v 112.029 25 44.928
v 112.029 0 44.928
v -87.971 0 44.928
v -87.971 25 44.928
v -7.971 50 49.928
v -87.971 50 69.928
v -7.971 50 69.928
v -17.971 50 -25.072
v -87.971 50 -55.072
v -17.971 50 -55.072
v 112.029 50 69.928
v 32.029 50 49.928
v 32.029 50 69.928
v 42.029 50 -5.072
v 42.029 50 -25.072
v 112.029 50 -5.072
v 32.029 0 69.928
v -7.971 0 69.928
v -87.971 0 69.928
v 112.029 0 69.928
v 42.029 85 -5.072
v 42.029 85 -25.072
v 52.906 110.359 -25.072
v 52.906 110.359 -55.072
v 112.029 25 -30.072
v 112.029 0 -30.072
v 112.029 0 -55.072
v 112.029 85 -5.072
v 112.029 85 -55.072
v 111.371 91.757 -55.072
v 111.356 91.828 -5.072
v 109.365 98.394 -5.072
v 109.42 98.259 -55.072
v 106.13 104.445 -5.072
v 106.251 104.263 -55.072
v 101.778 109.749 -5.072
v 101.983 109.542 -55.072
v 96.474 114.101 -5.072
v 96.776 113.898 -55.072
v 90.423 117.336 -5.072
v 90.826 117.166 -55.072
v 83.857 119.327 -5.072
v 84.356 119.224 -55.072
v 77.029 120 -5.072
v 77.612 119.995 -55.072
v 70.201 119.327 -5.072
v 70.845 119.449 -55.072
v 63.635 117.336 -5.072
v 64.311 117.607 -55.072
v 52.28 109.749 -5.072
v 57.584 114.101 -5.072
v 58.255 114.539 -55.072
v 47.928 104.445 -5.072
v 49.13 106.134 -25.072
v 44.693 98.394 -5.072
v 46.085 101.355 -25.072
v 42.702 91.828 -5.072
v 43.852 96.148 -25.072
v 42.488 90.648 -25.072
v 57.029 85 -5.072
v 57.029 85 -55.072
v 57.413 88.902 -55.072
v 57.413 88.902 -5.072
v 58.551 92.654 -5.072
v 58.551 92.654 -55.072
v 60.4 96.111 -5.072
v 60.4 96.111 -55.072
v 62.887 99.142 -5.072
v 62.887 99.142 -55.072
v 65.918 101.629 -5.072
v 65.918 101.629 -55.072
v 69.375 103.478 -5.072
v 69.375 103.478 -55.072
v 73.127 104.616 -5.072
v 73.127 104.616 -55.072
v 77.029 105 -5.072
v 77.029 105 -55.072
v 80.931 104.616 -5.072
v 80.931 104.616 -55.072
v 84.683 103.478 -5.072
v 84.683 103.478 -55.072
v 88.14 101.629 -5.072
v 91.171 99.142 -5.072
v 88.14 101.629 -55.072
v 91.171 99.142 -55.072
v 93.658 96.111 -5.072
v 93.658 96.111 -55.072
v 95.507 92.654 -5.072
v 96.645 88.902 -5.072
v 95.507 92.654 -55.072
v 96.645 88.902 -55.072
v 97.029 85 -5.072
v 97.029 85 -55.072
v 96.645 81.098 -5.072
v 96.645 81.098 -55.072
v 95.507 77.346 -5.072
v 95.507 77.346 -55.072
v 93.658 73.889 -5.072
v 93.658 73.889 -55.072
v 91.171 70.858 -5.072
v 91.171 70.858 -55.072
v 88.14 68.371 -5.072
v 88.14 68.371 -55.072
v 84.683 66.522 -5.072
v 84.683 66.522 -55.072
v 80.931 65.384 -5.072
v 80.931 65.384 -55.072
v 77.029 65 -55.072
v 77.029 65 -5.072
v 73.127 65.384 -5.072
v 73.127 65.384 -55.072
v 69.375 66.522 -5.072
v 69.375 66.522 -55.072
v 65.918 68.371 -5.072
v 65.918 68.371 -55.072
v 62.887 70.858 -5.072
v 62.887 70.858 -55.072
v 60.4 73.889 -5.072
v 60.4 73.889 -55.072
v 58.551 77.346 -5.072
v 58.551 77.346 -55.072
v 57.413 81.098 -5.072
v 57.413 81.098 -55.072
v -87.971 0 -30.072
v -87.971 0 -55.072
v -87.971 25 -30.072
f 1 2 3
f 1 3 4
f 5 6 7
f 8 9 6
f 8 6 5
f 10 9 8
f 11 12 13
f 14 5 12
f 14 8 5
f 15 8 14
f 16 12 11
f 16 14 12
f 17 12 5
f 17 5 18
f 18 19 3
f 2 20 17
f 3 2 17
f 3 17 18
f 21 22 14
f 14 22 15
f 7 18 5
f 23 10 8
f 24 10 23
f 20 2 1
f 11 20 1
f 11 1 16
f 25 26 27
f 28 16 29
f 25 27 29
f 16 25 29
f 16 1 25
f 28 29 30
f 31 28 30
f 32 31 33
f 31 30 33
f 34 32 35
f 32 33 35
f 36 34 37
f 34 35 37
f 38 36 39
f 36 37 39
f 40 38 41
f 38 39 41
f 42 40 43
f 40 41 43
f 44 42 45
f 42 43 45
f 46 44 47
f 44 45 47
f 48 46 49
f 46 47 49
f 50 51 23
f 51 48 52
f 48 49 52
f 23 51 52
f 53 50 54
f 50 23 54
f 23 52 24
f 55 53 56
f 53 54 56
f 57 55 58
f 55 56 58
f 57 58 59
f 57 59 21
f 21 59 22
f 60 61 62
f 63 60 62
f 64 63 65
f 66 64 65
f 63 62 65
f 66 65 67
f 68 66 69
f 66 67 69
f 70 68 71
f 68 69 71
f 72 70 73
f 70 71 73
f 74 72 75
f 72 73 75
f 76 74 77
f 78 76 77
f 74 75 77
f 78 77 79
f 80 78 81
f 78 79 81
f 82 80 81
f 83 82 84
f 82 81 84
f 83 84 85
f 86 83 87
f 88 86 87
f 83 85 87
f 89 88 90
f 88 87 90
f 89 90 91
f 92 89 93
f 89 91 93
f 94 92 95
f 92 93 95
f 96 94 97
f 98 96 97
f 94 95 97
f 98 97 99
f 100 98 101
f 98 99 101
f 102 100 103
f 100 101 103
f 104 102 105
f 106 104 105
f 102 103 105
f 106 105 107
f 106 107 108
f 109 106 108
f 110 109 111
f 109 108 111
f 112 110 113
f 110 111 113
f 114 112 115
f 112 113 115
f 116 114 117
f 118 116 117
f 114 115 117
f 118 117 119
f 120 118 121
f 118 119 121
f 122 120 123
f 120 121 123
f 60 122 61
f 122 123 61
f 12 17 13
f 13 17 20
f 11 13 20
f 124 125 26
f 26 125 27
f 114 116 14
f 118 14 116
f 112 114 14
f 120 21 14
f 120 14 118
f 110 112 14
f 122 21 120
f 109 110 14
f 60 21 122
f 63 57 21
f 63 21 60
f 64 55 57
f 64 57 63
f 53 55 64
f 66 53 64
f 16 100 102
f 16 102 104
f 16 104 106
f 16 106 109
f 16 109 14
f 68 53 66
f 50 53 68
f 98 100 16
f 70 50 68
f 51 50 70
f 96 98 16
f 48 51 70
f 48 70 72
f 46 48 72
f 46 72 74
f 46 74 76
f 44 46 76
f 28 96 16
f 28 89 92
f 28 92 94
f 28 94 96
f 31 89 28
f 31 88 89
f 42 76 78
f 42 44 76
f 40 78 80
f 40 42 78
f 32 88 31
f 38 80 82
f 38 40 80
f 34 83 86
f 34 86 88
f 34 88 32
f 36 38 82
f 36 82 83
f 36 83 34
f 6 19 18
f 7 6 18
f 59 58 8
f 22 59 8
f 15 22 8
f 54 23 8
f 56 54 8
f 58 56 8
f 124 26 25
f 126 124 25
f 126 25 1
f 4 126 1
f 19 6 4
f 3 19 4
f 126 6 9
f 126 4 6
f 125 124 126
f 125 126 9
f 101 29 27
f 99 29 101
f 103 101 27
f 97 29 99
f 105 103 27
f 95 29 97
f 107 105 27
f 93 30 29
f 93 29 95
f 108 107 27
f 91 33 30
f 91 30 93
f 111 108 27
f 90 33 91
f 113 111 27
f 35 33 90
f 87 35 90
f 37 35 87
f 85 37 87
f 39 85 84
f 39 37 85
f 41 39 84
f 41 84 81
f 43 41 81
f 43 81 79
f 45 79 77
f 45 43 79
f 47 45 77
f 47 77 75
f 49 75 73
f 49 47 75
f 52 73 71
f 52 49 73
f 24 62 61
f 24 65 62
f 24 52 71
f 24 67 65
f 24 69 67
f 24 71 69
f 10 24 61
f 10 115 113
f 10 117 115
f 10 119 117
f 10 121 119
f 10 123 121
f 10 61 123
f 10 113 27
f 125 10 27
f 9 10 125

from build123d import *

# Parameters (mm, degrees)
SKETCH4_W           = 200
SKETCH4_H           = 125
BOSS_EXTRUDE2_DEPTH = 50
SKETCH6_W           = 75
SKETCH6_H           = 25
CUT_EXTRUDE1_DEPTH  = 201
SKETCH7_W           = 40
SKETCH7_H           = 50
CUT_EXTRUDE2_DEPTH  = 20
BOSS_EXTRUDE5_DEPTH = 40
SKETCH10_R          = 20
BOSS_EXTRUDE6_DEPTH = 50
BOSS_EXTRUDE8_DEPTH = 30


with BuildPart() as part:
    # Sketch4 → Boss-Extrude2 (new body)
    with BuildSketch(Plane(origin=(0, 0, 0), x_dir=(1, 0, 0), z_dir=(0, 1, 0))):
        with Locations((12.028985507, -7.427536232)):
            Rectangle(SKETCH4_W, SKETCH4_H)
    extrude(amount=BOSS_EXTRUDE2_DEPTH)

    # Sketch6 → Cut-Extrude1 (cut, through all)
    with BuildSketch(Plane.ZY.offset(87.971014493)):
        with Locations((7.427536232, 12.5)):
            Rectangle(SKETCH6_W, SKETCH6_H)
    extrude(amount=-CUT_EXTRUDE1_DEPTH, mode=Mode.SUBTRACT)

    # Sketch7 → Cut-Extrude2 (cut)
    with BuildSketch(Plane.XY.offset(69.927536232)):
        with Locations((12.028985507, 25)):
            Rectangle(SKETCH7_W, SKETCH7_H)
    extrude(amount=-CUT_EXTRUDE2_DEPTH, mode=Mode.SUBTRACT)

    # Sketch9 → Boss-Extrude5 (add)
    with BuildSketch(Plane.ZY.offset(-32.028985507)):
        Polygon((49.927536232, 50), (69.927536232, 0), (49.927536232, 0), align=None)
    extrude(amount=BOSS_EXTRUDE5_DEPTH)

    # Sketch10 → Boss-Extrude6 (add)
    with BuildSketch(Plane(origin=(0, 0, -55.072463768), x_dir=(-1, 0, 0), z_dir=(0, 0, -1))):
        with BuildLine():
            Line((-42.028985507, 50), (-112.028985507, 50))
            Line((-112.028985507, 50), (-112.028985507, 85))
            ThreePointArc((-112.028985507, 85), (-77.028985507, 120), (-42.028985507, 85))
            Line((-42.028985507, 85), (-42.028985507, 50))
        make_face()
        with Locations((-77.028985507, 85)):
            Circle(SKETCH10_R, mode=Mode.SUBTRACT)
    extrude(amount=-BOSS_EXTRUDE6_DEPTH)

    # Sketch11 → Boss-Extrude8 (add)
    with BuildSketch(Plane(origin=(0, 0, -55.072463768), x_dir=(-1, 0, 0), z_dir=(0, 0, -1))):
        with BuildLine():
            Line((-42.028985507, 50), (17.971014493, 50))
            Line((17.971014493, 50), (-52.905907859, 110.358965373))
            ThreePointArc((-52.905907859, 110.358965373), (-44.862949711, 98.796598898), (-42.028985507, 85))
            Line((-42.028985507, 85), (-42.028985507, 50))
        make_face()
    extrude(amount=-BOSS_EXTRUDE8_DEPTH)


solid = part.part
